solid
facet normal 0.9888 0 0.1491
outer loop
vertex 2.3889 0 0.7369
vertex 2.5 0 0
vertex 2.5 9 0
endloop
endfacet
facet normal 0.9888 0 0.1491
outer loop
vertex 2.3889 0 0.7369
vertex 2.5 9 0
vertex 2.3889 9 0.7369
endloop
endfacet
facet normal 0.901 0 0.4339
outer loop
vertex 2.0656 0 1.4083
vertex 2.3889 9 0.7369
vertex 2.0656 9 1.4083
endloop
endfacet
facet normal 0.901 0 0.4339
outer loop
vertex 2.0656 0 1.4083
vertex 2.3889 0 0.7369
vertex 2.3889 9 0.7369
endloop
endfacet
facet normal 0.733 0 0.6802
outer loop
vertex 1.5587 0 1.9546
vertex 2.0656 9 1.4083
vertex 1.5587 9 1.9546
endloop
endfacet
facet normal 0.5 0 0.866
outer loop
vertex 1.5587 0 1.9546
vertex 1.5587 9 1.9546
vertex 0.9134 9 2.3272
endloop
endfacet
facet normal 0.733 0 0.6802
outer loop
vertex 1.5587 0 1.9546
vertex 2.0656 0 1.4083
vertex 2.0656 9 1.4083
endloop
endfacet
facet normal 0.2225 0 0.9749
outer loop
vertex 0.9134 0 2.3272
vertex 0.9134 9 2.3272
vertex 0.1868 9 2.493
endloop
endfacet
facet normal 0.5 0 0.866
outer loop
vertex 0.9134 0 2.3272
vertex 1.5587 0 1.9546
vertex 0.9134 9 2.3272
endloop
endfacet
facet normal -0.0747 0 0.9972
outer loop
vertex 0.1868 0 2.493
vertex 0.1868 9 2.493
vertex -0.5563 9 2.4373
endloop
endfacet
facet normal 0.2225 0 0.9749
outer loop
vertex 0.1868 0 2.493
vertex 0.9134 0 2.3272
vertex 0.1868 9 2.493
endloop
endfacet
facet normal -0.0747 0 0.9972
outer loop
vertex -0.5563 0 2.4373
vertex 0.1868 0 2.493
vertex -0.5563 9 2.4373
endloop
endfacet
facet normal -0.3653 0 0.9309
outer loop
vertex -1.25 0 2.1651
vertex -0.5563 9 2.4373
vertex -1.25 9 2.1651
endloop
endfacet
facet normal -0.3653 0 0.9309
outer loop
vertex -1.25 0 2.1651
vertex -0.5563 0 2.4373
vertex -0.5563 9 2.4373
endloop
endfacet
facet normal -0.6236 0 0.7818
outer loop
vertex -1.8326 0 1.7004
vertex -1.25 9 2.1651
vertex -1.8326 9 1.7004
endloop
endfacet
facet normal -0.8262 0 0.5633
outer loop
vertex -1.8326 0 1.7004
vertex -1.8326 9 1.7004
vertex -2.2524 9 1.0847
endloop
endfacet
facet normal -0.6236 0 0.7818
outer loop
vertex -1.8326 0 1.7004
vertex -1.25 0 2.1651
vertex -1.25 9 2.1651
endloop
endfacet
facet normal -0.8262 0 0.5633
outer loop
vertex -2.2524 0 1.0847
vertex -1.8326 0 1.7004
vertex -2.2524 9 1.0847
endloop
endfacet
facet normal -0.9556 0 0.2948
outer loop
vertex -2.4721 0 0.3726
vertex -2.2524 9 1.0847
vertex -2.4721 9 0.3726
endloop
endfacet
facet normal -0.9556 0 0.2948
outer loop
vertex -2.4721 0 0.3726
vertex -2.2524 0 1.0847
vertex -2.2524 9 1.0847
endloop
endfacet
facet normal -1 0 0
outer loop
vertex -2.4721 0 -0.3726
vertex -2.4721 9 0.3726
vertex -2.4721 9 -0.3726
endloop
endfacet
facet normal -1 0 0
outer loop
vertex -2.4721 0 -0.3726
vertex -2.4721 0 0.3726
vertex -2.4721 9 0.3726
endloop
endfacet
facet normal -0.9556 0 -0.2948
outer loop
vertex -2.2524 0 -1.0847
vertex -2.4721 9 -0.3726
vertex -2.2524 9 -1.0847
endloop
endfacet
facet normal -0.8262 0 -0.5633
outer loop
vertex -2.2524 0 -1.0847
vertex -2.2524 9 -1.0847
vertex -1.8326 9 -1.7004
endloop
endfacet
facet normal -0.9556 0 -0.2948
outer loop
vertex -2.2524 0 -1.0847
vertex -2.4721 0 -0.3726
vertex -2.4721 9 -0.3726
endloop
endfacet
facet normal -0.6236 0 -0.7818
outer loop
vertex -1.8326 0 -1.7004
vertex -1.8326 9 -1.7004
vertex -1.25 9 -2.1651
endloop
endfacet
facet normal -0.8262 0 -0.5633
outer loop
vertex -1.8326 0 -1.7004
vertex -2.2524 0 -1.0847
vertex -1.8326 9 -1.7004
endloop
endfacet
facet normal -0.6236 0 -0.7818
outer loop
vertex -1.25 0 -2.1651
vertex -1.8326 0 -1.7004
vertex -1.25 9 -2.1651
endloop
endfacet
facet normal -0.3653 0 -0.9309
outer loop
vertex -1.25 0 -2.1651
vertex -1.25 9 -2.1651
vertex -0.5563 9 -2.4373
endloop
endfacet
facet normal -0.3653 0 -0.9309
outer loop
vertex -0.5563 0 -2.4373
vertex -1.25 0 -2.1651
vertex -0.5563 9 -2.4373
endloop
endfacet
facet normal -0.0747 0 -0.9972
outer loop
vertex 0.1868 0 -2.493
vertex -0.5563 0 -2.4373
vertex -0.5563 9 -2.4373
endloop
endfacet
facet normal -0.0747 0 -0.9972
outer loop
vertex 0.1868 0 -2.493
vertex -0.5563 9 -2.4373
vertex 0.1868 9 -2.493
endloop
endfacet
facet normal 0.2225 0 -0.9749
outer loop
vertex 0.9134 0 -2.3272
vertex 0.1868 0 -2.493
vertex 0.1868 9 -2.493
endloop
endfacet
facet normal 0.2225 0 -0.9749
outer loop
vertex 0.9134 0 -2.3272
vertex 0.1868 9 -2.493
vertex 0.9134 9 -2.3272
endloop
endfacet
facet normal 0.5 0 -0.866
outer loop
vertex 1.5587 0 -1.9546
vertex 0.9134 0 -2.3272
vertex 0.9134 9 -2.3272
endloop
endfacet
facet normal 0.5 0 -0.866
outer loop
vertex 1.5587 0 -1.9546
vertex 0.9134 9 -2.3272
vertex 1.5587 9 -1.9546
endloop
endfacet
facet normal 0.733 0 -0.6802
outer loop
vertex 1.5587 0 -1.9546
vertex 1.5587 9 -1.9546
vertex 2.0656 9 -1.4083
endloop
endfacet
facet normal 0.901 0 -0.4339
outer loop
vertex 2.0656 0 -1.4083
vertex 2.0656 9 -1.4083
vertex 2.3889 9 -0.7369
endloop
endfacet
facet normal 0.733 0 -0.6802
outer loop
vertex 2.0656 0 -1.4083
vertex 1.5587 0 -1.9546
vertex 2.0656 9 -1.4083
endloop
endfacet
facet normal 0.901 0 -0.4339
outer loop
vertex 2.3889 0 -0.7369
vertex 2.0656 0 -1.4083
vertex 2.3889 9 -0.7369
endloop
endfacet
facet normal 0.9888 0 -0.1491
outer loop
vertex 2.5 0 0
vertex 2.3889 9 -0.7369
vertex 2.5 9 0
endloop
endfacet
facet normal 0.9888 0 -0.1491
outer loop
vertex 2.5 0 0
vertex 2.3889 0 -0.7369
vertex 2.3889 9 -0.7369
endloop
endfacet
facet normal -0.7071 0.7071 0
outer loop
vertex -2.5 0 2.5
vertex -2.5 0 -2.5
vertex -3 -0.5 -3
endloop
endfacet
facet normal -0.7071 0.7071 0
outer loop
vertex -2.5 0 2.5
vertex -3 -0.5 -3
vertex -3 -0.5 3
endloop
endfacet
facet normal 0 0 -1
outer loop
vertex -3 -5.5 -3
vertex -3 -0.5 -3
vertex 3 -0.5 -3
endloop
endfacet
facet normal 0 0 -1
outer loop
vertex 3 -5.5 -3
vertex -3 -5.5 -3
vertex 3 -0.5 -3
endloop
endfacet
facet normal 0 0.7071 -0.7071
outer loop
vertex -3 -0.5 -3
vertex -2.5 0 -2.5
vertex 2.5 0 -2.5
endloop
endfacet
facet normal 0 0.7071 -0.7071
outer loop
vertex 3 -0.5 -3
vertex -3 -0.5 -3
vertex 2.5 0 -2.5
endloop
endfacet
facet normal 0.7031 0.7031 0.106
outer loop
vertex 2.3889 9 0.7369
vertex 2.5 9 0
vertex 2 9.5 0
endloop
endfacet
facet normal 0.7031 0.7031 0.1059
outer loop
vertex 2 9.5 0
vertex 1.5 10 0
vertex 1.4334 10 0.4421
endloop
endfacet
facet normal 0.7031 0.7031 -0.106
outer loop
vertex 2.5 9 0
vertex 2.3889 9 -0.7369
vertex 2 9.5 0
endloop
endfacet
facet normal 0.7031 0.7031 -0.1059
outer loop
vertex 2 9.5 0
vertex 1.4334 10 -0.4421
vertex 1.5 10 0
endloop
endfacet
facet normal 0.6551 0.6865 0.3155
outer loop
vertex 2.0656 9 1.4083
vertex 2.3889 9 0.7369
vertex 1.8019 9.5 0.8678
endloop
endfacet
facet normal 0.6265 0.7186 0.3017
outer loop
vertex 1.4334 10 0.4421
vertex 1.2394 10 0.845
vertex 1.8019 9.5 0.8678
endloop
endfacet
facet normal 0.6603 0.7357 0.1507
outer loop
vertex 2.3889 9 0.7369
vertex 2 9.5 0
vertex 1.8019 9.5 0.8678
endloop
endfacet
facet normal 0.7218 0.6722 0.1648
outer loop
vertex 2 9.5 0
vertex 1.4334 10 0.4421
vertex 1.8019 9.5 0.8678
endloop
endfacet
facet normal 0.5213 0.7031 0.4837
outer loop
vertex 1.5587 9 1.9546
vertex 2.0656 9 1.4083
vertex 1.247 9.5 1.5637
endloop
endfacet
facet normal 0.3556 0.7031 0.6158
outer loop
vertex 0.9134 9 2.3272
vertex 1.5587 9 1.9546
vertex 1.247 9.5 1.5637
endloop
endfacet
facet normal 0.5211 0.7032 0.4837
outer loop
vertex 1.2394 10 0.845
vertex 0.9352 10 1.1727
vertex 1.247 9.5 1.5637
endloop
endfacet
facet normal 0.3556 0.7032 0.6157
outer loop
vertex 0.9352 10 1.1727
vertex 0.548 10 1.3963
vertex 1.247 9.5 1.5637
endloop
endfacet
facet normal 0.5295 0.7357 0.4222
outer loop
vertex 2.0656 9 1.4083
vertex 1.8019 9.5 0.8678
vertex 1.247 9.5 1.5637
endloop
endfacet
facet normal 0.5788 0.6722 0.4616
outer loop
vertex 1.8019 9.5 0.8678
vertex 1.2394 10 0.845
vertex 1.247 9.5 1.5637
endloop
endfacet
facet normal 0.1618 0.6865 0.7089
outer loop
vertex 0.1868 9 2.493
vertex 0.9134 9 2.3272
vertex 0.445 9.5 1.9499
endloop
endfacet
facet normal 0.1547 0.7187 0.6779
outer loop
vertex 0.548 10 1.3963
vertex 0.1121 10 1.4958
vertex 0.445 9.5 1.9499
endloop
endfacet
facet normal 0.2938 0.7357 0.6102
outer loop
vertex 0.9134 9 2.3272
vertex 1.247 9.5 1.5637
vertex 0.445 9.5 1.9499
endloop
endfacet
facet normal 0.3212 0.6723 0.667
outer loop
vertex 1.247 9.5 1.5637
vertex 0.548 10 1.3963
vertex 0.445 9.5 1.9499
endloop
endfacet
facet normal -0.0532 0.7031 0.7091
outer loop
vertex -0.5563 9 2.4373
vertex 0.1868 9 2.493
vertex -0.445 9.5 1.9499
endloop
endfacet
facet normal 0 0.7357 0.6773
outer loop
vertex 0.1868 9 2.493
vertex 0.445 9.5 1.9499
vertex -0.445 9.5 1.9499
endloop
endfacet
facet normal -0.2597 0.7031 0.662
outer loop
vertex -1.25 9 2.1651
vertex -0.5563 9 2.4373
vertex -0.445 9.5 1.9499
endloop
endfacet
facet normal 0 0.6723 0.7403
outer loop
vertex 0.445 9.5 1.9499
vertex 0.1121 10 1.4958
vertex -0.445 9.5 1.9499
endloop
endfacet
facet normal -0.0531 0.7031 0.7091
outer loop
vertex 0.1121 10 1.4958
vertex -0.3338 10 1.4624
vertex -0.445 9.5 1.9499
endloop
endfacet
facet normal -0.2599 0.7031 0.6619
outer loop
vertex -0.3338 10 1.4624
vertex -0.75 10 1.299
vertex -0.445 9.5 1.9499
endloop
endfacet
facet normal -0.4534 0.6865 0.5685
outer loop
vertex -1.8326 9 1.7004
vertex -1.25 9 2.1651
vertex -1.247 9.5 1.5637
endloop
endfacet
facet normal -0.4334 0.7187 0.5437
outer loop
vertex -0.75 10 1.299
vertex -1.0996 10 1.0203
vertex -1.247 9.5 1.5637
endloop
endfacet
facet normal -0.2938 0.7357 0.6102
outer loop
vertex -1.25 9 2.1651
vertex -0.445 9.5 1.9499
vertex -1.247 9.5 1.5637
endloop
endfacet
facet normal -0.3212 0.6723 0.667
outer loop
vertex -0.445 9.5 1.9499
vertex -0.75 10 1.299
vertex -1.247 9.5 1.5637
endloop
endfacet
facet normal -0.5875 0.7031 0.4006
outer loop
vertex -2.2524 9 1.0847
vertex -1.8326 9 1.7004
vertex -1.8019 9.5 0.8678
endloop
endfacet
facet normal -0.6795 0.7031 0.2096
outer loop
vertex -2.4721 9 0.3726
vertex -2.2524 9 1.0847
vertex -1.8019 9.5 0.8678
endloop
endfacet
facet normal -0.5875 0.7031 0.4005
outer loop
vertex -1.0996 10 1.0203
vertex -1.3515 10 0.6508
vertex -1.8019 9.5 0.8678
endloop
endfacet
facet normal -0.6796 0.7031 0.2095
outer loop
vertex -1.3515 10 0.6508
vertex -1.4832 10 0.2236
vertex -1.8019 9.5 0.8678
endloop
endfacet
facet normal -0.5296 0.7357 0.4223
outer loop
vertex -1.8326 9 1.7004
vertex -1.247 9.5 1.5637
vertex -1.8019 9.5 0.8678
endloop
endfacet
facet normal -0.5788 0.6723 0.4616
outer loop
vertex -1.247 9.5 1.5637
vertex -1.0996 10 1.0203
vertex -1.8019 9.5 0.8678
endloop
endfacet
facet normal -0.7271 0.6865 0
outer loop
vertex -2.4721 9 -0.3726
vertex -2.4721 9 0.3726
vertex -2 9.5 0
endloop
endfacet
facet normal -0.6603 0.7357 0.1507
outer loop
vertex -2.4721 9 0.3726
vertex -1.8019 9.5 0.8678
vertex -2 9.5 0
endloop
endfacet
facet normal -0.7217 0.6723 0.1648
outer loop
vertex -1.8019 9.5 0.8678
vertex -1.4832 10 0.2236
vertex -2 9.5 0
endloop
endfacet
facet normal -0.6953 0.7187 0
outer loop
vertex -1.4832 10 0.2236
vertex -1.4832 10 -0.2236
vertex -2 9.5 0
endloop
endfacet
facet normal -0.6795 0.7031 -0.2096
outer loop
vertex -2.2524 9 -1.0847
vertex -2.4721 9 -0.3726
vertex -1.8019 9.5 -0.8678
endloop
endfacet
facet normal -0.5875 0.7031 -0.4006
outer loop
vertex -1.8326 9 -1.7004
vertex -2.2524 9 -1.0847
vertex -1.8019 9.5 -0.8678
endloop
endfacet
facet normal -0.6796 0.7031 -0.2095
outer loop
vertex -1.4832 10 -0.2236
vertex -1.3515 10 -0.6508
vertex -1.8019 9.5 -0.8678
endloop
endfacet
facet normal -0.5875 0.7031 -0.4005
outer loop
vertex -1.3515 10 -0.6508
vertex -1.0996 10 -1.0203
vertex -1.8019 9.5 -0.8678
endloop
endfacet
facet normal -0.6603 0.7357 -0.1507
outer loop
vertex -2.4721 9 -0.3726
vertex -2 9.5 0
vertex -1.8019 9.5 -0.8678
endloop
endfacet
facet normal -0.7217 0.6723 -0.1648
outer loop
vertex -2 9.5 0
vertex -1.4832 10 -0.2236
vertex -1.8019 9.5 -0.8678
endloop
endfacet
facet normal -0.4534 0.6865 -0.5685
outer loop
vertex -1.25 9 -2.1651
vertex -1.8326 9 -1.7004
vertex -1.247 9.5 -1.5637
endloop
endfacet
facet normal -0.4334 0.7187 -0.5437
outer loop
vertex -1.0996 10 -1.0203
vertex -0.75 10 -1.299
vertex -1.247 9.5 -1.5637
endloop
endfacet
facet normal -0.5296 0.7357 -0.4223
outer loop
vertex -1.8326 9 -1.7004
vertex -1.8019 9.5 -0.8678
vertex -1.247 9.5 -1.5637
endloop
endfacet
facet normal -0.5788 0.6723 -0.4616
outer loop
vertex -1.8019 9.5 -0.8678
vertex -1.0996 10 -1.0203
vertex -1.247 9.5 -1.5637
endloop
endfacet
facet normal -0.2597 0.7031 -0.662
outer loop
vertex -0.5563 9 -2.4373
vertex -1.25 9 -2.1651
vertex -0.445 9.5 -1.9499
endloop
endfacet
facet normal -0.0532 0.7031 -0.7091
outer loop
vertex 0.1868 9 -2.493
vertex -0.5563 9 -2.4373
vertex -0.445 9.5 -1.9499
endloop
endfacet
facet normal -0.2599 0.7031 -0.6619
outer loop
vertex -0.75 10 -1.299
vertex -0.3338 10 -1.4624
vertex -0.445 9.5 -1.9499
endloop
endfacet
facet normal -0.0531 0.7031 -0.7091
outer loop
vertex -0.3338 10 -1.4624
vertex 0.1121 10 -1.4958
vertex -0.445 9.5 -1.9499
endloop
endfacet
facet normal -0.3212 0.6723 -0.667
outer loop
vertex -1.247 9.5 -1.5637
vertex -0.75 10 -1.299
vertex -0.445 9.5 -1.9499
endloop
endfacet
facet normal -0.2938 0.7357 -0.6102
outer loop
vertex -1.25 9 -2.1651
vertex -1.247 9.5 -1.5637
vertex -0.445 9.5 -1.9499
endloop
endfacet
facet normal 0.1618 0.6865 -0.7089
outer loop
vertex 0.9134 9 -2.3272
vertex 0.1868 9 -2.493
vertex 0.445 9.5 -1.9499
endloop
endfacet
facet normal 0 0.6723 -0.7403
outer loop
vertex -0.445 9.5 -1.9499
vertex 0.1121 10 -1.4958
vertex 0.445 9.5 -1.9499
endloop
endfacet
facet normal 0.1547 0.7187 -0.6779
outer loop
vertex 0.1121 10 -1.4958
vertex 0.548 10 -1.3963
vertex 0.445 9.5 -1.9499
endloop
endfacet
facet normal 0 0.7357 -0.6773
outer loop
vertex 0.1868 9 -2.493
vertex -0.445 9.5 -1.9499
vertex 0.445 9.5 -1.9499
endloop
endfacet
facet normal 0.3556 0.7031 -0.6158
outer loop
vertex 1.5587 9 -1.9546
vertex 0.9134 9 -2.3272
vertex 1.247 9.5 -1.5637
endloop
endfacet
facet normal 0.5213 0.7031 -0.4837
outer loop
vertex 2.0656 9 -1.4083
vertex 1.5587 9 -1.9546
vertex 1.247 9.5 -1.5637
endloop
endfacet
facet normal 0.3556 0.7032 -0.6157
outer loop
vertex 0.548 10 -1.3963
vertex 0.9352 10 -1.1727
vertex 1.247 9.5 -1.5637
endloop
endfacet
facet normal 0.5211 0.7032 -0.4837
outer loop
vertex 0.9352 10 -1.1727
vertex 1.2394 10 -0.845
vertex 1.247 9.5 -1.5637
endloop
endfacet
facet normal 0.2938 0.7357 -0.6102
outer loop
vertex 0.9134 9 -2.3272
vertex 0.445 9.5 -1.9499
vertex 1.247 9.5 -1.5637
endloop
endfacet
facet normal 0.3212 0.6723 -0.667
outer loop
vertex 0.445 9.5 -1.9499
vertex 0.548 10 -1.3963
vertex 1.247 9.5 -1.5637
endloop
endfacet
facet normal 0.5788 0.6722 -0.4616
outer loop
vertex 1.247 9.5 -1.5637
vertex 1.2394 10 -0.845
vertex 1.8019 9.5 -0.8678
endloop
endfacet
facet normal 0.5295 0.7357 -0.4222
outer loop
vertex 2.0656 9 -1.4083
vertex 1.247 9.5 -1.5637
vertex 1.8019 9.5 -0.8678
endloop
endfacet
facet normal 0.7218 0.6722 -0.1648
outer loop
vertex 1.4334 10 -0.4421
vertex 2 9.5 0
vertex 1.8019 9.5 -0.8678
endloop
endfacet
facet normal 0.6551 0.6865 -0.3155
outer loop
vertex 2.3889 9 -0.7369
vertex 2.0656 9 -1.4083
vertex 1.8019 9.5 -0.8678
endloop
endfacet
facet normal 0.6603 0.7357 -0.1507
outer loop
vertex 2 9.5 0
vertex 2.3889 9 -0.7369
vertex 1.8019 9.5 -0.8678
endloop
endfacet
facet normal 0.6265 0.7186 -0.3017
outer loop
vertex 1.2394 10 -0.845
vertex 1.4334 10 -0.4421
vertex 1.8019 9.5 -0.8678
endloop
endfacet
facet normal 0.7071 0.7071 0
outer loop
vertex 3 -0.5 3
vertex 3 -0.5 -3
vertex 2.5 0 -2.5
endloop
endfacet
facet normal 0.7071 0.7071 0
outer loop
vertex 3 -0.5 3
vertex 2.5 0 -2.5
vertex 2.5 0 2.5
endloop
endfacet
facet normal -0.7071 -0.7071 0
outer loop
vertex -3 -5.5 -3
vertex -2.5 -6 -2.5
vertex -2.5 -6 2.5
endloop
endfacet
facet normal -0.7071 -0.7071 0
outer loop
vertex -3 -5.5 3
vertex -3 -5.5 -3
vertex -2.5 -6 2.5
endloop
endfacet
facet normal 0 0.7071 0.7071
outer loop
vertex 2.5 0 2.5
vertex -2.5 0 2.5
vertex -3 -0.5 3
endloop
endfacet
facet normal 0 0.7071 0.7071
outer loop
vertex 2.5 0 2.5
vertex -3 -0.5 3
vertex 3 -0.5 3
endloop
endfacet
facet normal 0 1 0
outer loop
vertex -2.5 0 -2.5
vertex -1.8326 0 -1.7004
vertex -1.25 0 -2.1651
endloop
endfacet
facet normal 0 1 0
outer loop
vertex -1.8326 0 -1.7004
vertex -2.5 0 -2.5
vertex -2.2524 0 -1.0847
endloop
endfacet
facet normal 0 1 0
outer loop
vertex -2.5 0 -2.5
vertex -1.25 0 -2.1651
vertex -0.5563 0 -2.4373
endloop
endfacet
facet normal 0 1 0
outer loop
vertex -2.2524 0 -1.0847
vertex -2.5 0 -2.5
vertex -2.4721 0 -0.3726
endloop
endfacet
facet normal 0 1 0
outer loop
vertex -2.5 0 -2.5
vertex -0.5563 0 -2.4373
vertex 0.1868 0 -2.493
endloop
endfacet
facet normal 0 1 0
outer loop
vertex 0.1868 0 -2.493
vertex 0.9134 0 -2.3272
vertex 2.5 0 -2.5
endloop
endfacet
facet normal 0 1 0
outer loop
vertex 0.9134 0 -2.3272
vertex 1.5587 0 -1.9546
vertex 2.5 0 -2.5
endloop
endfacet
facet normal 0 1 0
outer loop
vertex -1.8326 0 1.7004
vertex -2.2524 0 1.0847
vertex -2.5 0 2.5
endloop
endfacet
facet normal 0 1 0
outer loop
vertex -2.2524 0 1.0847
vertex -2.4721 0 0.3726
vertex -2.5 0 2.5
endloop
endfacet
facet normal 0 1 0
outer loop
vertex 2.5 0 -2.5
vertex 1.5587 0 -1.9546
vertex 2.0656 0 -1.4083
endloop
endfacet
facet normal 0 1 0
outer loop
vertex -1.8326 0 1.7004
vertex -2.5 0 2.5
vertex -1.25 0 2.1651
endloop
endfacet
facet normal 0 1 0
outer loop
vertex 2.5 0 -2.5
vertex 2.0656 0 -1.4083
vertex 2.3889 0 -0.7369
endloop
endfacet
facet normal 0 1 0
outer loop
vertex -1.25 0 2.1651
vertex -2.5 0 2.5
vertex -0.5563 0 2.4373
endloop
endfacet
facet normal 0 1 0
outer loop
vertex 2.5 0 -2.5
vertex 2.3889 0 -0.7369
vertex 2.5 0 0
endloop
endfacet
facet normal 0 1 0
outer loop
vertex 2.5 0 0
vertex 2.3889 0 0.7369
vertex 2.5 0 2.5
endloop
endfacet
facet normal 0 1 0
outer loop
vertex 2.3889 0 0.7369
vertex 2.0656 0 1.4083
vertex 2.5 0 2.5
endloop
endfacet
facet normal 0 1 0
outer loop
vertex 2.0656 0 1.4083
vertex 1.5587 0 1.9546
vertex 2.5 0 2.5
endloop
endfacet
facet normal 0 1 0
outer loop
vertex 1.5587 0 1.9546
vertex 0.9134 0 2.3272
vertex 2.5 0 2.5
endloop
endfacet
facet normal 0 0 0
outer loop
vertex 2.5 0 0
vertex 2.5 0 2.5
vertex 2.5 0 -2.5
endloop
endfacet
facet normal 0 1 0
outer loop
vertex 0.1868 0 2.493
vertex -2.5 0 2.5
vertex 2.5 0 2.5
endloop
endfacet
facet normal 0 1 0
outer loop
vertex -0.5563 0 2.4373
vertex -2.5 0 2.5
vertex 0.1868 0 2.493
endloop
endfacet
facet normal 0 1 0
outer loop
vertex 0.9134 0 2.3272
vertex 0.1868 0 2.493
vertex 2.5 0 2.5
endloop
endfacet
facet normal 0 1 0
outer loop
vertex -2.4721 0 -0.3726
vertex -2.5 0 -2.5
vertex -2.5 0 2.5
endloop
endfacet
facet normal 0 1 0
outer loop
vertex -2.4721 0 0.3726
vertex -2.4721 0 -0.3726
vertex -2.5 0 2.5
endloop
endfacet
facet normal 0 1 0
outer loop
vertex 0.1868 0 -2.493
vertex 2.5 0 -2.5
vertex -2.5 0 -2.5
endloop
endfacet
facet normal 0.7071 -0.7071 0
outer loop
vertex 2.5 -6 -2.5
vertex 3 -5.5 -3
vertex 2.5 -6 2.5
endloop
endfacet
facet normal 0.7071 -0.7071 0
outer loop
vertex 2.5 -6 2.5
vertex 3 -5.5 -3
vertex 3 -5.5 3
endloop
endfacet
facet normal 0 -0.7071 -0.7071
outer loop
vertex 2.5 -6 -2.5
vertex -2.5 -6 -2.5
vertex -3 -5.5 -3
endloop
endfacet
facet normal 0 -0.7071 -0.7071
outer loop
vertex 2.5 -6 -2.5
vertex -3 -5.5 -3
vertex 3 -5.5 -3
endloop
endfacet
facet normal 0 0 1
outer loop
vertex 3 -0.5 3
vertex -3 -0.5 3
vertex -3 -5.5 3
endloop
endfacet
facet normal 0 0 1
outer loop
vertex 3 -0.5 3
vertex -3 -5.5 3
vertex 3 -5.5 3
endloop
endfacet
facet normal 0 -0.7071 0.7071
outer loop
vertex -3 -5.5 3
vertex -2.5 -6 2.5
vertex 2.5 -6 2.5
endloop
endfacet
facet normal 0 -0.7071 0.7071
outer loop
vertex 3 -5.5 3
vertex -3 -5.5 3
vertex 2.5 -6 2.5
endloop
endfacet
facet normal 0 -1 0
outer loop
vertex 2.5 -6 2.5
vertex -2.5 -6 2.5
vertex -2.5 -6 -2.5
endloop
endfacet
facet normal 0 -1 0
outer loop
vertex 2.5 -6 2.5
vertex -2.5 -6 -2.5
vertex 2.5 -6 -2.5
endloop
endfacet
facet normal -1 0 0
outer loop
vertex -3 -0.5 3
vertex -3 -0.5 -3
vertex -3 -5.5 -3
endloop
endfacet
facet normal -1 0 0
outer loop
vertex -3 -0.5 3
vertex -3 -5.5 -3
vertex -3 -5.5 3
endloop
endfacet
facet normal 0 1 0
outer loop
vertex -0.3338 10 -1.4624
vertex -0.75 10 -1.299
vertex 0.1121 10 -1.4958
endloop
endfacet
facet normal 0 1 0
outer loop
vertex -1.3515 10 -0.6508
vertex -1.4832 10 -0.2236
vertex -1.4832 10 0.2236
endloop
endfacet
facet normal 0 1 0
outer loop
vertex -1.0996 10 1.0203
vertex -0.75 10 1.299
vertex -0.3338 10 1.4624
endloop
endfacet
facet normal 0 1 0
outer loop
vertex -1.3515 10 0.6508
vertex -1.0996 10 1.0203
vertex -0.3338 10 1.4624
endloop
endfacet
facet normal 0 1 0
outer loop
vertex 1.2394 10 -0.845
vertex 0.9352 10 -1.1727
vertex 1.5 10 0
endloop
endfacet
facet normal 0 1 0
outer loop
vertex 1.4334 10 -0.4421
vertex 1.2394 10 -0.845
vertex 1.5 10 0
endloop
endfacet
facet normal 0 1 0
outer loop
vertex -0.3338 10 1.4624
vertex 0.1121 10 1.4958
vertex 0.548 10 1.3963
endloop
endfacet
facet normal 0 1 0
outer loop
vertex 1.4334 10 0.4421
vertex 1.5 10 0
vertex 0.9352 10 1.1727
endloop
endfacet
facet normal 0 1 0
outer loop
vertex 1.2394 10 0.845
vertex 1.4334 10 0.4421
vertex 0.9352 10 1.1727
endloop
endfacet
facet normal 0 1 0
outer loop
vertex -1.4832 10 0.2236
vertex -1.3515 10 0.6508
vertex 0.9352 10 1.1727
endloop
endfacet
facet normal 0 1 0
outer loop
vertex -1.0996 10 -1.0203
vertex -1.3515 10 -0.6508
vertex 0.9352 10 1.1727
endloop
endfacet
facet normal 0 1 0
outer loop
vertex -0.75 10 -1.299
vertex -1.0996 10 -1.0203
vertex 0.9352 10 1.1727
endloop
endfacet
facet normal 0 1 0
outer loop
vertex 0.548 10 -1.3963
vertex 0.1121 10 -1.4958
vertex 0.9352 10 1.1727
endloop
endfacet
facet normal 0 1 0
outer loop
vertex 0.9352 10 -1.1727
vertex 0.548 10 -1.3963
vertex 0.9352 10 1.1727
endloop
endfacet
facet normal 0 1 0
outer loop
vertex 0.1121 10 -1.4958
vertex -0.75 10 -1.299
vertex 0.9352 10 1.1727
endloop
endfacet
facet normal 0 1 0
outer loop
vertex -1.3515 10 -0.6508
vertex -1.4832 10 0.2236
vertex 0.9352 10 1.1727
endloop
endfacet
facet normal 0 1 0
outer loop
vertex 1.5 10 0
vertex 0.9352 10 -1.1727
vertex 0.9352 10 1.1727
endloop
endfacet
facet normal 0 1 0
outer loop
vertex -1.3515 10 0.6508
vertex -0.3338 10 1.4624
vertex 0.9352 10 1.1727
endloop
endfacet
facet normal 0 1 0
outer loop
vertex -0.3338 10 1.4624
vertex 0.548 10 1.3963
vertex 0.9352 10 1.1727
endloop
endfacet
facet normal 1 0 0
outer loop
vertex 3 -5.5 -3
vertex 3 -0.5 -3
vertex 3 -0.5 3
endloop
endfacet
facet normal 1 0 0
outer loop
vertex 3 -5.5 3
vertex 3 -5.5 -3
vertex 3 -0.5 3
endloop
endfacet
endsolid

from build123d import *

# Parameters (mm, degrees)
F0_R          = 2.5
F1_DEPTH      = 10
F1_DEPTH_BACK = 6
F2_SIZE       = 1
F0_W          = 6
F0_H          = 6
F3_DEPTH      = 6
F4_SIZE       = 0.49999


# Not quite as in the source:
# - a fillet or chamfer is up to 0.001 mm smaller than in the source, because OpenCascade refuses the exact size


with BuildPart() as f1:
    # F0 (on Front) → F1 (new body, two sides)
    with BuildSketch(Plane.XZ) as f1_sk:
        Circle(F0_R)
    extrude(amount=-F1_DEPTH)
    extrude(f1_sk.sketch, amount=F1_DEPTH_BACK)

    # F2
    f2_edges = [f1.edges().sort_by_distance(p)[0] for p in [
        (-2.5, 10, 0),
    ]]
    chamfer(f2_edges, length=F2_SIZE)

    # F0 (on Front) → F3 (join)
    with BuildSketch(Plane.XZ):
        Rectangle(F0_W, F0_H)
        Circle(F0_R, mode=Mode.SUBTRACT)
    extrude(amount=F3_DEPTH)

    # F4 (size 0.5 in the source; OpenCascade refuses exactly that, so slightly less here)
    f4_edges = [f1.edges().sort_by_distance(p)[0] for p in [
        (3, -6, 0),
        (0, -6, 3),
        (-3, -6, 0),
        (0, -6, -3),
        (3, 0, 0),
        (-3, 0, 0),
        (0, 0, 3),
        (0, 0, -3),
    ]]
    chamfer(f4_edges, length=F4_SIZE)


solid = f1.part
